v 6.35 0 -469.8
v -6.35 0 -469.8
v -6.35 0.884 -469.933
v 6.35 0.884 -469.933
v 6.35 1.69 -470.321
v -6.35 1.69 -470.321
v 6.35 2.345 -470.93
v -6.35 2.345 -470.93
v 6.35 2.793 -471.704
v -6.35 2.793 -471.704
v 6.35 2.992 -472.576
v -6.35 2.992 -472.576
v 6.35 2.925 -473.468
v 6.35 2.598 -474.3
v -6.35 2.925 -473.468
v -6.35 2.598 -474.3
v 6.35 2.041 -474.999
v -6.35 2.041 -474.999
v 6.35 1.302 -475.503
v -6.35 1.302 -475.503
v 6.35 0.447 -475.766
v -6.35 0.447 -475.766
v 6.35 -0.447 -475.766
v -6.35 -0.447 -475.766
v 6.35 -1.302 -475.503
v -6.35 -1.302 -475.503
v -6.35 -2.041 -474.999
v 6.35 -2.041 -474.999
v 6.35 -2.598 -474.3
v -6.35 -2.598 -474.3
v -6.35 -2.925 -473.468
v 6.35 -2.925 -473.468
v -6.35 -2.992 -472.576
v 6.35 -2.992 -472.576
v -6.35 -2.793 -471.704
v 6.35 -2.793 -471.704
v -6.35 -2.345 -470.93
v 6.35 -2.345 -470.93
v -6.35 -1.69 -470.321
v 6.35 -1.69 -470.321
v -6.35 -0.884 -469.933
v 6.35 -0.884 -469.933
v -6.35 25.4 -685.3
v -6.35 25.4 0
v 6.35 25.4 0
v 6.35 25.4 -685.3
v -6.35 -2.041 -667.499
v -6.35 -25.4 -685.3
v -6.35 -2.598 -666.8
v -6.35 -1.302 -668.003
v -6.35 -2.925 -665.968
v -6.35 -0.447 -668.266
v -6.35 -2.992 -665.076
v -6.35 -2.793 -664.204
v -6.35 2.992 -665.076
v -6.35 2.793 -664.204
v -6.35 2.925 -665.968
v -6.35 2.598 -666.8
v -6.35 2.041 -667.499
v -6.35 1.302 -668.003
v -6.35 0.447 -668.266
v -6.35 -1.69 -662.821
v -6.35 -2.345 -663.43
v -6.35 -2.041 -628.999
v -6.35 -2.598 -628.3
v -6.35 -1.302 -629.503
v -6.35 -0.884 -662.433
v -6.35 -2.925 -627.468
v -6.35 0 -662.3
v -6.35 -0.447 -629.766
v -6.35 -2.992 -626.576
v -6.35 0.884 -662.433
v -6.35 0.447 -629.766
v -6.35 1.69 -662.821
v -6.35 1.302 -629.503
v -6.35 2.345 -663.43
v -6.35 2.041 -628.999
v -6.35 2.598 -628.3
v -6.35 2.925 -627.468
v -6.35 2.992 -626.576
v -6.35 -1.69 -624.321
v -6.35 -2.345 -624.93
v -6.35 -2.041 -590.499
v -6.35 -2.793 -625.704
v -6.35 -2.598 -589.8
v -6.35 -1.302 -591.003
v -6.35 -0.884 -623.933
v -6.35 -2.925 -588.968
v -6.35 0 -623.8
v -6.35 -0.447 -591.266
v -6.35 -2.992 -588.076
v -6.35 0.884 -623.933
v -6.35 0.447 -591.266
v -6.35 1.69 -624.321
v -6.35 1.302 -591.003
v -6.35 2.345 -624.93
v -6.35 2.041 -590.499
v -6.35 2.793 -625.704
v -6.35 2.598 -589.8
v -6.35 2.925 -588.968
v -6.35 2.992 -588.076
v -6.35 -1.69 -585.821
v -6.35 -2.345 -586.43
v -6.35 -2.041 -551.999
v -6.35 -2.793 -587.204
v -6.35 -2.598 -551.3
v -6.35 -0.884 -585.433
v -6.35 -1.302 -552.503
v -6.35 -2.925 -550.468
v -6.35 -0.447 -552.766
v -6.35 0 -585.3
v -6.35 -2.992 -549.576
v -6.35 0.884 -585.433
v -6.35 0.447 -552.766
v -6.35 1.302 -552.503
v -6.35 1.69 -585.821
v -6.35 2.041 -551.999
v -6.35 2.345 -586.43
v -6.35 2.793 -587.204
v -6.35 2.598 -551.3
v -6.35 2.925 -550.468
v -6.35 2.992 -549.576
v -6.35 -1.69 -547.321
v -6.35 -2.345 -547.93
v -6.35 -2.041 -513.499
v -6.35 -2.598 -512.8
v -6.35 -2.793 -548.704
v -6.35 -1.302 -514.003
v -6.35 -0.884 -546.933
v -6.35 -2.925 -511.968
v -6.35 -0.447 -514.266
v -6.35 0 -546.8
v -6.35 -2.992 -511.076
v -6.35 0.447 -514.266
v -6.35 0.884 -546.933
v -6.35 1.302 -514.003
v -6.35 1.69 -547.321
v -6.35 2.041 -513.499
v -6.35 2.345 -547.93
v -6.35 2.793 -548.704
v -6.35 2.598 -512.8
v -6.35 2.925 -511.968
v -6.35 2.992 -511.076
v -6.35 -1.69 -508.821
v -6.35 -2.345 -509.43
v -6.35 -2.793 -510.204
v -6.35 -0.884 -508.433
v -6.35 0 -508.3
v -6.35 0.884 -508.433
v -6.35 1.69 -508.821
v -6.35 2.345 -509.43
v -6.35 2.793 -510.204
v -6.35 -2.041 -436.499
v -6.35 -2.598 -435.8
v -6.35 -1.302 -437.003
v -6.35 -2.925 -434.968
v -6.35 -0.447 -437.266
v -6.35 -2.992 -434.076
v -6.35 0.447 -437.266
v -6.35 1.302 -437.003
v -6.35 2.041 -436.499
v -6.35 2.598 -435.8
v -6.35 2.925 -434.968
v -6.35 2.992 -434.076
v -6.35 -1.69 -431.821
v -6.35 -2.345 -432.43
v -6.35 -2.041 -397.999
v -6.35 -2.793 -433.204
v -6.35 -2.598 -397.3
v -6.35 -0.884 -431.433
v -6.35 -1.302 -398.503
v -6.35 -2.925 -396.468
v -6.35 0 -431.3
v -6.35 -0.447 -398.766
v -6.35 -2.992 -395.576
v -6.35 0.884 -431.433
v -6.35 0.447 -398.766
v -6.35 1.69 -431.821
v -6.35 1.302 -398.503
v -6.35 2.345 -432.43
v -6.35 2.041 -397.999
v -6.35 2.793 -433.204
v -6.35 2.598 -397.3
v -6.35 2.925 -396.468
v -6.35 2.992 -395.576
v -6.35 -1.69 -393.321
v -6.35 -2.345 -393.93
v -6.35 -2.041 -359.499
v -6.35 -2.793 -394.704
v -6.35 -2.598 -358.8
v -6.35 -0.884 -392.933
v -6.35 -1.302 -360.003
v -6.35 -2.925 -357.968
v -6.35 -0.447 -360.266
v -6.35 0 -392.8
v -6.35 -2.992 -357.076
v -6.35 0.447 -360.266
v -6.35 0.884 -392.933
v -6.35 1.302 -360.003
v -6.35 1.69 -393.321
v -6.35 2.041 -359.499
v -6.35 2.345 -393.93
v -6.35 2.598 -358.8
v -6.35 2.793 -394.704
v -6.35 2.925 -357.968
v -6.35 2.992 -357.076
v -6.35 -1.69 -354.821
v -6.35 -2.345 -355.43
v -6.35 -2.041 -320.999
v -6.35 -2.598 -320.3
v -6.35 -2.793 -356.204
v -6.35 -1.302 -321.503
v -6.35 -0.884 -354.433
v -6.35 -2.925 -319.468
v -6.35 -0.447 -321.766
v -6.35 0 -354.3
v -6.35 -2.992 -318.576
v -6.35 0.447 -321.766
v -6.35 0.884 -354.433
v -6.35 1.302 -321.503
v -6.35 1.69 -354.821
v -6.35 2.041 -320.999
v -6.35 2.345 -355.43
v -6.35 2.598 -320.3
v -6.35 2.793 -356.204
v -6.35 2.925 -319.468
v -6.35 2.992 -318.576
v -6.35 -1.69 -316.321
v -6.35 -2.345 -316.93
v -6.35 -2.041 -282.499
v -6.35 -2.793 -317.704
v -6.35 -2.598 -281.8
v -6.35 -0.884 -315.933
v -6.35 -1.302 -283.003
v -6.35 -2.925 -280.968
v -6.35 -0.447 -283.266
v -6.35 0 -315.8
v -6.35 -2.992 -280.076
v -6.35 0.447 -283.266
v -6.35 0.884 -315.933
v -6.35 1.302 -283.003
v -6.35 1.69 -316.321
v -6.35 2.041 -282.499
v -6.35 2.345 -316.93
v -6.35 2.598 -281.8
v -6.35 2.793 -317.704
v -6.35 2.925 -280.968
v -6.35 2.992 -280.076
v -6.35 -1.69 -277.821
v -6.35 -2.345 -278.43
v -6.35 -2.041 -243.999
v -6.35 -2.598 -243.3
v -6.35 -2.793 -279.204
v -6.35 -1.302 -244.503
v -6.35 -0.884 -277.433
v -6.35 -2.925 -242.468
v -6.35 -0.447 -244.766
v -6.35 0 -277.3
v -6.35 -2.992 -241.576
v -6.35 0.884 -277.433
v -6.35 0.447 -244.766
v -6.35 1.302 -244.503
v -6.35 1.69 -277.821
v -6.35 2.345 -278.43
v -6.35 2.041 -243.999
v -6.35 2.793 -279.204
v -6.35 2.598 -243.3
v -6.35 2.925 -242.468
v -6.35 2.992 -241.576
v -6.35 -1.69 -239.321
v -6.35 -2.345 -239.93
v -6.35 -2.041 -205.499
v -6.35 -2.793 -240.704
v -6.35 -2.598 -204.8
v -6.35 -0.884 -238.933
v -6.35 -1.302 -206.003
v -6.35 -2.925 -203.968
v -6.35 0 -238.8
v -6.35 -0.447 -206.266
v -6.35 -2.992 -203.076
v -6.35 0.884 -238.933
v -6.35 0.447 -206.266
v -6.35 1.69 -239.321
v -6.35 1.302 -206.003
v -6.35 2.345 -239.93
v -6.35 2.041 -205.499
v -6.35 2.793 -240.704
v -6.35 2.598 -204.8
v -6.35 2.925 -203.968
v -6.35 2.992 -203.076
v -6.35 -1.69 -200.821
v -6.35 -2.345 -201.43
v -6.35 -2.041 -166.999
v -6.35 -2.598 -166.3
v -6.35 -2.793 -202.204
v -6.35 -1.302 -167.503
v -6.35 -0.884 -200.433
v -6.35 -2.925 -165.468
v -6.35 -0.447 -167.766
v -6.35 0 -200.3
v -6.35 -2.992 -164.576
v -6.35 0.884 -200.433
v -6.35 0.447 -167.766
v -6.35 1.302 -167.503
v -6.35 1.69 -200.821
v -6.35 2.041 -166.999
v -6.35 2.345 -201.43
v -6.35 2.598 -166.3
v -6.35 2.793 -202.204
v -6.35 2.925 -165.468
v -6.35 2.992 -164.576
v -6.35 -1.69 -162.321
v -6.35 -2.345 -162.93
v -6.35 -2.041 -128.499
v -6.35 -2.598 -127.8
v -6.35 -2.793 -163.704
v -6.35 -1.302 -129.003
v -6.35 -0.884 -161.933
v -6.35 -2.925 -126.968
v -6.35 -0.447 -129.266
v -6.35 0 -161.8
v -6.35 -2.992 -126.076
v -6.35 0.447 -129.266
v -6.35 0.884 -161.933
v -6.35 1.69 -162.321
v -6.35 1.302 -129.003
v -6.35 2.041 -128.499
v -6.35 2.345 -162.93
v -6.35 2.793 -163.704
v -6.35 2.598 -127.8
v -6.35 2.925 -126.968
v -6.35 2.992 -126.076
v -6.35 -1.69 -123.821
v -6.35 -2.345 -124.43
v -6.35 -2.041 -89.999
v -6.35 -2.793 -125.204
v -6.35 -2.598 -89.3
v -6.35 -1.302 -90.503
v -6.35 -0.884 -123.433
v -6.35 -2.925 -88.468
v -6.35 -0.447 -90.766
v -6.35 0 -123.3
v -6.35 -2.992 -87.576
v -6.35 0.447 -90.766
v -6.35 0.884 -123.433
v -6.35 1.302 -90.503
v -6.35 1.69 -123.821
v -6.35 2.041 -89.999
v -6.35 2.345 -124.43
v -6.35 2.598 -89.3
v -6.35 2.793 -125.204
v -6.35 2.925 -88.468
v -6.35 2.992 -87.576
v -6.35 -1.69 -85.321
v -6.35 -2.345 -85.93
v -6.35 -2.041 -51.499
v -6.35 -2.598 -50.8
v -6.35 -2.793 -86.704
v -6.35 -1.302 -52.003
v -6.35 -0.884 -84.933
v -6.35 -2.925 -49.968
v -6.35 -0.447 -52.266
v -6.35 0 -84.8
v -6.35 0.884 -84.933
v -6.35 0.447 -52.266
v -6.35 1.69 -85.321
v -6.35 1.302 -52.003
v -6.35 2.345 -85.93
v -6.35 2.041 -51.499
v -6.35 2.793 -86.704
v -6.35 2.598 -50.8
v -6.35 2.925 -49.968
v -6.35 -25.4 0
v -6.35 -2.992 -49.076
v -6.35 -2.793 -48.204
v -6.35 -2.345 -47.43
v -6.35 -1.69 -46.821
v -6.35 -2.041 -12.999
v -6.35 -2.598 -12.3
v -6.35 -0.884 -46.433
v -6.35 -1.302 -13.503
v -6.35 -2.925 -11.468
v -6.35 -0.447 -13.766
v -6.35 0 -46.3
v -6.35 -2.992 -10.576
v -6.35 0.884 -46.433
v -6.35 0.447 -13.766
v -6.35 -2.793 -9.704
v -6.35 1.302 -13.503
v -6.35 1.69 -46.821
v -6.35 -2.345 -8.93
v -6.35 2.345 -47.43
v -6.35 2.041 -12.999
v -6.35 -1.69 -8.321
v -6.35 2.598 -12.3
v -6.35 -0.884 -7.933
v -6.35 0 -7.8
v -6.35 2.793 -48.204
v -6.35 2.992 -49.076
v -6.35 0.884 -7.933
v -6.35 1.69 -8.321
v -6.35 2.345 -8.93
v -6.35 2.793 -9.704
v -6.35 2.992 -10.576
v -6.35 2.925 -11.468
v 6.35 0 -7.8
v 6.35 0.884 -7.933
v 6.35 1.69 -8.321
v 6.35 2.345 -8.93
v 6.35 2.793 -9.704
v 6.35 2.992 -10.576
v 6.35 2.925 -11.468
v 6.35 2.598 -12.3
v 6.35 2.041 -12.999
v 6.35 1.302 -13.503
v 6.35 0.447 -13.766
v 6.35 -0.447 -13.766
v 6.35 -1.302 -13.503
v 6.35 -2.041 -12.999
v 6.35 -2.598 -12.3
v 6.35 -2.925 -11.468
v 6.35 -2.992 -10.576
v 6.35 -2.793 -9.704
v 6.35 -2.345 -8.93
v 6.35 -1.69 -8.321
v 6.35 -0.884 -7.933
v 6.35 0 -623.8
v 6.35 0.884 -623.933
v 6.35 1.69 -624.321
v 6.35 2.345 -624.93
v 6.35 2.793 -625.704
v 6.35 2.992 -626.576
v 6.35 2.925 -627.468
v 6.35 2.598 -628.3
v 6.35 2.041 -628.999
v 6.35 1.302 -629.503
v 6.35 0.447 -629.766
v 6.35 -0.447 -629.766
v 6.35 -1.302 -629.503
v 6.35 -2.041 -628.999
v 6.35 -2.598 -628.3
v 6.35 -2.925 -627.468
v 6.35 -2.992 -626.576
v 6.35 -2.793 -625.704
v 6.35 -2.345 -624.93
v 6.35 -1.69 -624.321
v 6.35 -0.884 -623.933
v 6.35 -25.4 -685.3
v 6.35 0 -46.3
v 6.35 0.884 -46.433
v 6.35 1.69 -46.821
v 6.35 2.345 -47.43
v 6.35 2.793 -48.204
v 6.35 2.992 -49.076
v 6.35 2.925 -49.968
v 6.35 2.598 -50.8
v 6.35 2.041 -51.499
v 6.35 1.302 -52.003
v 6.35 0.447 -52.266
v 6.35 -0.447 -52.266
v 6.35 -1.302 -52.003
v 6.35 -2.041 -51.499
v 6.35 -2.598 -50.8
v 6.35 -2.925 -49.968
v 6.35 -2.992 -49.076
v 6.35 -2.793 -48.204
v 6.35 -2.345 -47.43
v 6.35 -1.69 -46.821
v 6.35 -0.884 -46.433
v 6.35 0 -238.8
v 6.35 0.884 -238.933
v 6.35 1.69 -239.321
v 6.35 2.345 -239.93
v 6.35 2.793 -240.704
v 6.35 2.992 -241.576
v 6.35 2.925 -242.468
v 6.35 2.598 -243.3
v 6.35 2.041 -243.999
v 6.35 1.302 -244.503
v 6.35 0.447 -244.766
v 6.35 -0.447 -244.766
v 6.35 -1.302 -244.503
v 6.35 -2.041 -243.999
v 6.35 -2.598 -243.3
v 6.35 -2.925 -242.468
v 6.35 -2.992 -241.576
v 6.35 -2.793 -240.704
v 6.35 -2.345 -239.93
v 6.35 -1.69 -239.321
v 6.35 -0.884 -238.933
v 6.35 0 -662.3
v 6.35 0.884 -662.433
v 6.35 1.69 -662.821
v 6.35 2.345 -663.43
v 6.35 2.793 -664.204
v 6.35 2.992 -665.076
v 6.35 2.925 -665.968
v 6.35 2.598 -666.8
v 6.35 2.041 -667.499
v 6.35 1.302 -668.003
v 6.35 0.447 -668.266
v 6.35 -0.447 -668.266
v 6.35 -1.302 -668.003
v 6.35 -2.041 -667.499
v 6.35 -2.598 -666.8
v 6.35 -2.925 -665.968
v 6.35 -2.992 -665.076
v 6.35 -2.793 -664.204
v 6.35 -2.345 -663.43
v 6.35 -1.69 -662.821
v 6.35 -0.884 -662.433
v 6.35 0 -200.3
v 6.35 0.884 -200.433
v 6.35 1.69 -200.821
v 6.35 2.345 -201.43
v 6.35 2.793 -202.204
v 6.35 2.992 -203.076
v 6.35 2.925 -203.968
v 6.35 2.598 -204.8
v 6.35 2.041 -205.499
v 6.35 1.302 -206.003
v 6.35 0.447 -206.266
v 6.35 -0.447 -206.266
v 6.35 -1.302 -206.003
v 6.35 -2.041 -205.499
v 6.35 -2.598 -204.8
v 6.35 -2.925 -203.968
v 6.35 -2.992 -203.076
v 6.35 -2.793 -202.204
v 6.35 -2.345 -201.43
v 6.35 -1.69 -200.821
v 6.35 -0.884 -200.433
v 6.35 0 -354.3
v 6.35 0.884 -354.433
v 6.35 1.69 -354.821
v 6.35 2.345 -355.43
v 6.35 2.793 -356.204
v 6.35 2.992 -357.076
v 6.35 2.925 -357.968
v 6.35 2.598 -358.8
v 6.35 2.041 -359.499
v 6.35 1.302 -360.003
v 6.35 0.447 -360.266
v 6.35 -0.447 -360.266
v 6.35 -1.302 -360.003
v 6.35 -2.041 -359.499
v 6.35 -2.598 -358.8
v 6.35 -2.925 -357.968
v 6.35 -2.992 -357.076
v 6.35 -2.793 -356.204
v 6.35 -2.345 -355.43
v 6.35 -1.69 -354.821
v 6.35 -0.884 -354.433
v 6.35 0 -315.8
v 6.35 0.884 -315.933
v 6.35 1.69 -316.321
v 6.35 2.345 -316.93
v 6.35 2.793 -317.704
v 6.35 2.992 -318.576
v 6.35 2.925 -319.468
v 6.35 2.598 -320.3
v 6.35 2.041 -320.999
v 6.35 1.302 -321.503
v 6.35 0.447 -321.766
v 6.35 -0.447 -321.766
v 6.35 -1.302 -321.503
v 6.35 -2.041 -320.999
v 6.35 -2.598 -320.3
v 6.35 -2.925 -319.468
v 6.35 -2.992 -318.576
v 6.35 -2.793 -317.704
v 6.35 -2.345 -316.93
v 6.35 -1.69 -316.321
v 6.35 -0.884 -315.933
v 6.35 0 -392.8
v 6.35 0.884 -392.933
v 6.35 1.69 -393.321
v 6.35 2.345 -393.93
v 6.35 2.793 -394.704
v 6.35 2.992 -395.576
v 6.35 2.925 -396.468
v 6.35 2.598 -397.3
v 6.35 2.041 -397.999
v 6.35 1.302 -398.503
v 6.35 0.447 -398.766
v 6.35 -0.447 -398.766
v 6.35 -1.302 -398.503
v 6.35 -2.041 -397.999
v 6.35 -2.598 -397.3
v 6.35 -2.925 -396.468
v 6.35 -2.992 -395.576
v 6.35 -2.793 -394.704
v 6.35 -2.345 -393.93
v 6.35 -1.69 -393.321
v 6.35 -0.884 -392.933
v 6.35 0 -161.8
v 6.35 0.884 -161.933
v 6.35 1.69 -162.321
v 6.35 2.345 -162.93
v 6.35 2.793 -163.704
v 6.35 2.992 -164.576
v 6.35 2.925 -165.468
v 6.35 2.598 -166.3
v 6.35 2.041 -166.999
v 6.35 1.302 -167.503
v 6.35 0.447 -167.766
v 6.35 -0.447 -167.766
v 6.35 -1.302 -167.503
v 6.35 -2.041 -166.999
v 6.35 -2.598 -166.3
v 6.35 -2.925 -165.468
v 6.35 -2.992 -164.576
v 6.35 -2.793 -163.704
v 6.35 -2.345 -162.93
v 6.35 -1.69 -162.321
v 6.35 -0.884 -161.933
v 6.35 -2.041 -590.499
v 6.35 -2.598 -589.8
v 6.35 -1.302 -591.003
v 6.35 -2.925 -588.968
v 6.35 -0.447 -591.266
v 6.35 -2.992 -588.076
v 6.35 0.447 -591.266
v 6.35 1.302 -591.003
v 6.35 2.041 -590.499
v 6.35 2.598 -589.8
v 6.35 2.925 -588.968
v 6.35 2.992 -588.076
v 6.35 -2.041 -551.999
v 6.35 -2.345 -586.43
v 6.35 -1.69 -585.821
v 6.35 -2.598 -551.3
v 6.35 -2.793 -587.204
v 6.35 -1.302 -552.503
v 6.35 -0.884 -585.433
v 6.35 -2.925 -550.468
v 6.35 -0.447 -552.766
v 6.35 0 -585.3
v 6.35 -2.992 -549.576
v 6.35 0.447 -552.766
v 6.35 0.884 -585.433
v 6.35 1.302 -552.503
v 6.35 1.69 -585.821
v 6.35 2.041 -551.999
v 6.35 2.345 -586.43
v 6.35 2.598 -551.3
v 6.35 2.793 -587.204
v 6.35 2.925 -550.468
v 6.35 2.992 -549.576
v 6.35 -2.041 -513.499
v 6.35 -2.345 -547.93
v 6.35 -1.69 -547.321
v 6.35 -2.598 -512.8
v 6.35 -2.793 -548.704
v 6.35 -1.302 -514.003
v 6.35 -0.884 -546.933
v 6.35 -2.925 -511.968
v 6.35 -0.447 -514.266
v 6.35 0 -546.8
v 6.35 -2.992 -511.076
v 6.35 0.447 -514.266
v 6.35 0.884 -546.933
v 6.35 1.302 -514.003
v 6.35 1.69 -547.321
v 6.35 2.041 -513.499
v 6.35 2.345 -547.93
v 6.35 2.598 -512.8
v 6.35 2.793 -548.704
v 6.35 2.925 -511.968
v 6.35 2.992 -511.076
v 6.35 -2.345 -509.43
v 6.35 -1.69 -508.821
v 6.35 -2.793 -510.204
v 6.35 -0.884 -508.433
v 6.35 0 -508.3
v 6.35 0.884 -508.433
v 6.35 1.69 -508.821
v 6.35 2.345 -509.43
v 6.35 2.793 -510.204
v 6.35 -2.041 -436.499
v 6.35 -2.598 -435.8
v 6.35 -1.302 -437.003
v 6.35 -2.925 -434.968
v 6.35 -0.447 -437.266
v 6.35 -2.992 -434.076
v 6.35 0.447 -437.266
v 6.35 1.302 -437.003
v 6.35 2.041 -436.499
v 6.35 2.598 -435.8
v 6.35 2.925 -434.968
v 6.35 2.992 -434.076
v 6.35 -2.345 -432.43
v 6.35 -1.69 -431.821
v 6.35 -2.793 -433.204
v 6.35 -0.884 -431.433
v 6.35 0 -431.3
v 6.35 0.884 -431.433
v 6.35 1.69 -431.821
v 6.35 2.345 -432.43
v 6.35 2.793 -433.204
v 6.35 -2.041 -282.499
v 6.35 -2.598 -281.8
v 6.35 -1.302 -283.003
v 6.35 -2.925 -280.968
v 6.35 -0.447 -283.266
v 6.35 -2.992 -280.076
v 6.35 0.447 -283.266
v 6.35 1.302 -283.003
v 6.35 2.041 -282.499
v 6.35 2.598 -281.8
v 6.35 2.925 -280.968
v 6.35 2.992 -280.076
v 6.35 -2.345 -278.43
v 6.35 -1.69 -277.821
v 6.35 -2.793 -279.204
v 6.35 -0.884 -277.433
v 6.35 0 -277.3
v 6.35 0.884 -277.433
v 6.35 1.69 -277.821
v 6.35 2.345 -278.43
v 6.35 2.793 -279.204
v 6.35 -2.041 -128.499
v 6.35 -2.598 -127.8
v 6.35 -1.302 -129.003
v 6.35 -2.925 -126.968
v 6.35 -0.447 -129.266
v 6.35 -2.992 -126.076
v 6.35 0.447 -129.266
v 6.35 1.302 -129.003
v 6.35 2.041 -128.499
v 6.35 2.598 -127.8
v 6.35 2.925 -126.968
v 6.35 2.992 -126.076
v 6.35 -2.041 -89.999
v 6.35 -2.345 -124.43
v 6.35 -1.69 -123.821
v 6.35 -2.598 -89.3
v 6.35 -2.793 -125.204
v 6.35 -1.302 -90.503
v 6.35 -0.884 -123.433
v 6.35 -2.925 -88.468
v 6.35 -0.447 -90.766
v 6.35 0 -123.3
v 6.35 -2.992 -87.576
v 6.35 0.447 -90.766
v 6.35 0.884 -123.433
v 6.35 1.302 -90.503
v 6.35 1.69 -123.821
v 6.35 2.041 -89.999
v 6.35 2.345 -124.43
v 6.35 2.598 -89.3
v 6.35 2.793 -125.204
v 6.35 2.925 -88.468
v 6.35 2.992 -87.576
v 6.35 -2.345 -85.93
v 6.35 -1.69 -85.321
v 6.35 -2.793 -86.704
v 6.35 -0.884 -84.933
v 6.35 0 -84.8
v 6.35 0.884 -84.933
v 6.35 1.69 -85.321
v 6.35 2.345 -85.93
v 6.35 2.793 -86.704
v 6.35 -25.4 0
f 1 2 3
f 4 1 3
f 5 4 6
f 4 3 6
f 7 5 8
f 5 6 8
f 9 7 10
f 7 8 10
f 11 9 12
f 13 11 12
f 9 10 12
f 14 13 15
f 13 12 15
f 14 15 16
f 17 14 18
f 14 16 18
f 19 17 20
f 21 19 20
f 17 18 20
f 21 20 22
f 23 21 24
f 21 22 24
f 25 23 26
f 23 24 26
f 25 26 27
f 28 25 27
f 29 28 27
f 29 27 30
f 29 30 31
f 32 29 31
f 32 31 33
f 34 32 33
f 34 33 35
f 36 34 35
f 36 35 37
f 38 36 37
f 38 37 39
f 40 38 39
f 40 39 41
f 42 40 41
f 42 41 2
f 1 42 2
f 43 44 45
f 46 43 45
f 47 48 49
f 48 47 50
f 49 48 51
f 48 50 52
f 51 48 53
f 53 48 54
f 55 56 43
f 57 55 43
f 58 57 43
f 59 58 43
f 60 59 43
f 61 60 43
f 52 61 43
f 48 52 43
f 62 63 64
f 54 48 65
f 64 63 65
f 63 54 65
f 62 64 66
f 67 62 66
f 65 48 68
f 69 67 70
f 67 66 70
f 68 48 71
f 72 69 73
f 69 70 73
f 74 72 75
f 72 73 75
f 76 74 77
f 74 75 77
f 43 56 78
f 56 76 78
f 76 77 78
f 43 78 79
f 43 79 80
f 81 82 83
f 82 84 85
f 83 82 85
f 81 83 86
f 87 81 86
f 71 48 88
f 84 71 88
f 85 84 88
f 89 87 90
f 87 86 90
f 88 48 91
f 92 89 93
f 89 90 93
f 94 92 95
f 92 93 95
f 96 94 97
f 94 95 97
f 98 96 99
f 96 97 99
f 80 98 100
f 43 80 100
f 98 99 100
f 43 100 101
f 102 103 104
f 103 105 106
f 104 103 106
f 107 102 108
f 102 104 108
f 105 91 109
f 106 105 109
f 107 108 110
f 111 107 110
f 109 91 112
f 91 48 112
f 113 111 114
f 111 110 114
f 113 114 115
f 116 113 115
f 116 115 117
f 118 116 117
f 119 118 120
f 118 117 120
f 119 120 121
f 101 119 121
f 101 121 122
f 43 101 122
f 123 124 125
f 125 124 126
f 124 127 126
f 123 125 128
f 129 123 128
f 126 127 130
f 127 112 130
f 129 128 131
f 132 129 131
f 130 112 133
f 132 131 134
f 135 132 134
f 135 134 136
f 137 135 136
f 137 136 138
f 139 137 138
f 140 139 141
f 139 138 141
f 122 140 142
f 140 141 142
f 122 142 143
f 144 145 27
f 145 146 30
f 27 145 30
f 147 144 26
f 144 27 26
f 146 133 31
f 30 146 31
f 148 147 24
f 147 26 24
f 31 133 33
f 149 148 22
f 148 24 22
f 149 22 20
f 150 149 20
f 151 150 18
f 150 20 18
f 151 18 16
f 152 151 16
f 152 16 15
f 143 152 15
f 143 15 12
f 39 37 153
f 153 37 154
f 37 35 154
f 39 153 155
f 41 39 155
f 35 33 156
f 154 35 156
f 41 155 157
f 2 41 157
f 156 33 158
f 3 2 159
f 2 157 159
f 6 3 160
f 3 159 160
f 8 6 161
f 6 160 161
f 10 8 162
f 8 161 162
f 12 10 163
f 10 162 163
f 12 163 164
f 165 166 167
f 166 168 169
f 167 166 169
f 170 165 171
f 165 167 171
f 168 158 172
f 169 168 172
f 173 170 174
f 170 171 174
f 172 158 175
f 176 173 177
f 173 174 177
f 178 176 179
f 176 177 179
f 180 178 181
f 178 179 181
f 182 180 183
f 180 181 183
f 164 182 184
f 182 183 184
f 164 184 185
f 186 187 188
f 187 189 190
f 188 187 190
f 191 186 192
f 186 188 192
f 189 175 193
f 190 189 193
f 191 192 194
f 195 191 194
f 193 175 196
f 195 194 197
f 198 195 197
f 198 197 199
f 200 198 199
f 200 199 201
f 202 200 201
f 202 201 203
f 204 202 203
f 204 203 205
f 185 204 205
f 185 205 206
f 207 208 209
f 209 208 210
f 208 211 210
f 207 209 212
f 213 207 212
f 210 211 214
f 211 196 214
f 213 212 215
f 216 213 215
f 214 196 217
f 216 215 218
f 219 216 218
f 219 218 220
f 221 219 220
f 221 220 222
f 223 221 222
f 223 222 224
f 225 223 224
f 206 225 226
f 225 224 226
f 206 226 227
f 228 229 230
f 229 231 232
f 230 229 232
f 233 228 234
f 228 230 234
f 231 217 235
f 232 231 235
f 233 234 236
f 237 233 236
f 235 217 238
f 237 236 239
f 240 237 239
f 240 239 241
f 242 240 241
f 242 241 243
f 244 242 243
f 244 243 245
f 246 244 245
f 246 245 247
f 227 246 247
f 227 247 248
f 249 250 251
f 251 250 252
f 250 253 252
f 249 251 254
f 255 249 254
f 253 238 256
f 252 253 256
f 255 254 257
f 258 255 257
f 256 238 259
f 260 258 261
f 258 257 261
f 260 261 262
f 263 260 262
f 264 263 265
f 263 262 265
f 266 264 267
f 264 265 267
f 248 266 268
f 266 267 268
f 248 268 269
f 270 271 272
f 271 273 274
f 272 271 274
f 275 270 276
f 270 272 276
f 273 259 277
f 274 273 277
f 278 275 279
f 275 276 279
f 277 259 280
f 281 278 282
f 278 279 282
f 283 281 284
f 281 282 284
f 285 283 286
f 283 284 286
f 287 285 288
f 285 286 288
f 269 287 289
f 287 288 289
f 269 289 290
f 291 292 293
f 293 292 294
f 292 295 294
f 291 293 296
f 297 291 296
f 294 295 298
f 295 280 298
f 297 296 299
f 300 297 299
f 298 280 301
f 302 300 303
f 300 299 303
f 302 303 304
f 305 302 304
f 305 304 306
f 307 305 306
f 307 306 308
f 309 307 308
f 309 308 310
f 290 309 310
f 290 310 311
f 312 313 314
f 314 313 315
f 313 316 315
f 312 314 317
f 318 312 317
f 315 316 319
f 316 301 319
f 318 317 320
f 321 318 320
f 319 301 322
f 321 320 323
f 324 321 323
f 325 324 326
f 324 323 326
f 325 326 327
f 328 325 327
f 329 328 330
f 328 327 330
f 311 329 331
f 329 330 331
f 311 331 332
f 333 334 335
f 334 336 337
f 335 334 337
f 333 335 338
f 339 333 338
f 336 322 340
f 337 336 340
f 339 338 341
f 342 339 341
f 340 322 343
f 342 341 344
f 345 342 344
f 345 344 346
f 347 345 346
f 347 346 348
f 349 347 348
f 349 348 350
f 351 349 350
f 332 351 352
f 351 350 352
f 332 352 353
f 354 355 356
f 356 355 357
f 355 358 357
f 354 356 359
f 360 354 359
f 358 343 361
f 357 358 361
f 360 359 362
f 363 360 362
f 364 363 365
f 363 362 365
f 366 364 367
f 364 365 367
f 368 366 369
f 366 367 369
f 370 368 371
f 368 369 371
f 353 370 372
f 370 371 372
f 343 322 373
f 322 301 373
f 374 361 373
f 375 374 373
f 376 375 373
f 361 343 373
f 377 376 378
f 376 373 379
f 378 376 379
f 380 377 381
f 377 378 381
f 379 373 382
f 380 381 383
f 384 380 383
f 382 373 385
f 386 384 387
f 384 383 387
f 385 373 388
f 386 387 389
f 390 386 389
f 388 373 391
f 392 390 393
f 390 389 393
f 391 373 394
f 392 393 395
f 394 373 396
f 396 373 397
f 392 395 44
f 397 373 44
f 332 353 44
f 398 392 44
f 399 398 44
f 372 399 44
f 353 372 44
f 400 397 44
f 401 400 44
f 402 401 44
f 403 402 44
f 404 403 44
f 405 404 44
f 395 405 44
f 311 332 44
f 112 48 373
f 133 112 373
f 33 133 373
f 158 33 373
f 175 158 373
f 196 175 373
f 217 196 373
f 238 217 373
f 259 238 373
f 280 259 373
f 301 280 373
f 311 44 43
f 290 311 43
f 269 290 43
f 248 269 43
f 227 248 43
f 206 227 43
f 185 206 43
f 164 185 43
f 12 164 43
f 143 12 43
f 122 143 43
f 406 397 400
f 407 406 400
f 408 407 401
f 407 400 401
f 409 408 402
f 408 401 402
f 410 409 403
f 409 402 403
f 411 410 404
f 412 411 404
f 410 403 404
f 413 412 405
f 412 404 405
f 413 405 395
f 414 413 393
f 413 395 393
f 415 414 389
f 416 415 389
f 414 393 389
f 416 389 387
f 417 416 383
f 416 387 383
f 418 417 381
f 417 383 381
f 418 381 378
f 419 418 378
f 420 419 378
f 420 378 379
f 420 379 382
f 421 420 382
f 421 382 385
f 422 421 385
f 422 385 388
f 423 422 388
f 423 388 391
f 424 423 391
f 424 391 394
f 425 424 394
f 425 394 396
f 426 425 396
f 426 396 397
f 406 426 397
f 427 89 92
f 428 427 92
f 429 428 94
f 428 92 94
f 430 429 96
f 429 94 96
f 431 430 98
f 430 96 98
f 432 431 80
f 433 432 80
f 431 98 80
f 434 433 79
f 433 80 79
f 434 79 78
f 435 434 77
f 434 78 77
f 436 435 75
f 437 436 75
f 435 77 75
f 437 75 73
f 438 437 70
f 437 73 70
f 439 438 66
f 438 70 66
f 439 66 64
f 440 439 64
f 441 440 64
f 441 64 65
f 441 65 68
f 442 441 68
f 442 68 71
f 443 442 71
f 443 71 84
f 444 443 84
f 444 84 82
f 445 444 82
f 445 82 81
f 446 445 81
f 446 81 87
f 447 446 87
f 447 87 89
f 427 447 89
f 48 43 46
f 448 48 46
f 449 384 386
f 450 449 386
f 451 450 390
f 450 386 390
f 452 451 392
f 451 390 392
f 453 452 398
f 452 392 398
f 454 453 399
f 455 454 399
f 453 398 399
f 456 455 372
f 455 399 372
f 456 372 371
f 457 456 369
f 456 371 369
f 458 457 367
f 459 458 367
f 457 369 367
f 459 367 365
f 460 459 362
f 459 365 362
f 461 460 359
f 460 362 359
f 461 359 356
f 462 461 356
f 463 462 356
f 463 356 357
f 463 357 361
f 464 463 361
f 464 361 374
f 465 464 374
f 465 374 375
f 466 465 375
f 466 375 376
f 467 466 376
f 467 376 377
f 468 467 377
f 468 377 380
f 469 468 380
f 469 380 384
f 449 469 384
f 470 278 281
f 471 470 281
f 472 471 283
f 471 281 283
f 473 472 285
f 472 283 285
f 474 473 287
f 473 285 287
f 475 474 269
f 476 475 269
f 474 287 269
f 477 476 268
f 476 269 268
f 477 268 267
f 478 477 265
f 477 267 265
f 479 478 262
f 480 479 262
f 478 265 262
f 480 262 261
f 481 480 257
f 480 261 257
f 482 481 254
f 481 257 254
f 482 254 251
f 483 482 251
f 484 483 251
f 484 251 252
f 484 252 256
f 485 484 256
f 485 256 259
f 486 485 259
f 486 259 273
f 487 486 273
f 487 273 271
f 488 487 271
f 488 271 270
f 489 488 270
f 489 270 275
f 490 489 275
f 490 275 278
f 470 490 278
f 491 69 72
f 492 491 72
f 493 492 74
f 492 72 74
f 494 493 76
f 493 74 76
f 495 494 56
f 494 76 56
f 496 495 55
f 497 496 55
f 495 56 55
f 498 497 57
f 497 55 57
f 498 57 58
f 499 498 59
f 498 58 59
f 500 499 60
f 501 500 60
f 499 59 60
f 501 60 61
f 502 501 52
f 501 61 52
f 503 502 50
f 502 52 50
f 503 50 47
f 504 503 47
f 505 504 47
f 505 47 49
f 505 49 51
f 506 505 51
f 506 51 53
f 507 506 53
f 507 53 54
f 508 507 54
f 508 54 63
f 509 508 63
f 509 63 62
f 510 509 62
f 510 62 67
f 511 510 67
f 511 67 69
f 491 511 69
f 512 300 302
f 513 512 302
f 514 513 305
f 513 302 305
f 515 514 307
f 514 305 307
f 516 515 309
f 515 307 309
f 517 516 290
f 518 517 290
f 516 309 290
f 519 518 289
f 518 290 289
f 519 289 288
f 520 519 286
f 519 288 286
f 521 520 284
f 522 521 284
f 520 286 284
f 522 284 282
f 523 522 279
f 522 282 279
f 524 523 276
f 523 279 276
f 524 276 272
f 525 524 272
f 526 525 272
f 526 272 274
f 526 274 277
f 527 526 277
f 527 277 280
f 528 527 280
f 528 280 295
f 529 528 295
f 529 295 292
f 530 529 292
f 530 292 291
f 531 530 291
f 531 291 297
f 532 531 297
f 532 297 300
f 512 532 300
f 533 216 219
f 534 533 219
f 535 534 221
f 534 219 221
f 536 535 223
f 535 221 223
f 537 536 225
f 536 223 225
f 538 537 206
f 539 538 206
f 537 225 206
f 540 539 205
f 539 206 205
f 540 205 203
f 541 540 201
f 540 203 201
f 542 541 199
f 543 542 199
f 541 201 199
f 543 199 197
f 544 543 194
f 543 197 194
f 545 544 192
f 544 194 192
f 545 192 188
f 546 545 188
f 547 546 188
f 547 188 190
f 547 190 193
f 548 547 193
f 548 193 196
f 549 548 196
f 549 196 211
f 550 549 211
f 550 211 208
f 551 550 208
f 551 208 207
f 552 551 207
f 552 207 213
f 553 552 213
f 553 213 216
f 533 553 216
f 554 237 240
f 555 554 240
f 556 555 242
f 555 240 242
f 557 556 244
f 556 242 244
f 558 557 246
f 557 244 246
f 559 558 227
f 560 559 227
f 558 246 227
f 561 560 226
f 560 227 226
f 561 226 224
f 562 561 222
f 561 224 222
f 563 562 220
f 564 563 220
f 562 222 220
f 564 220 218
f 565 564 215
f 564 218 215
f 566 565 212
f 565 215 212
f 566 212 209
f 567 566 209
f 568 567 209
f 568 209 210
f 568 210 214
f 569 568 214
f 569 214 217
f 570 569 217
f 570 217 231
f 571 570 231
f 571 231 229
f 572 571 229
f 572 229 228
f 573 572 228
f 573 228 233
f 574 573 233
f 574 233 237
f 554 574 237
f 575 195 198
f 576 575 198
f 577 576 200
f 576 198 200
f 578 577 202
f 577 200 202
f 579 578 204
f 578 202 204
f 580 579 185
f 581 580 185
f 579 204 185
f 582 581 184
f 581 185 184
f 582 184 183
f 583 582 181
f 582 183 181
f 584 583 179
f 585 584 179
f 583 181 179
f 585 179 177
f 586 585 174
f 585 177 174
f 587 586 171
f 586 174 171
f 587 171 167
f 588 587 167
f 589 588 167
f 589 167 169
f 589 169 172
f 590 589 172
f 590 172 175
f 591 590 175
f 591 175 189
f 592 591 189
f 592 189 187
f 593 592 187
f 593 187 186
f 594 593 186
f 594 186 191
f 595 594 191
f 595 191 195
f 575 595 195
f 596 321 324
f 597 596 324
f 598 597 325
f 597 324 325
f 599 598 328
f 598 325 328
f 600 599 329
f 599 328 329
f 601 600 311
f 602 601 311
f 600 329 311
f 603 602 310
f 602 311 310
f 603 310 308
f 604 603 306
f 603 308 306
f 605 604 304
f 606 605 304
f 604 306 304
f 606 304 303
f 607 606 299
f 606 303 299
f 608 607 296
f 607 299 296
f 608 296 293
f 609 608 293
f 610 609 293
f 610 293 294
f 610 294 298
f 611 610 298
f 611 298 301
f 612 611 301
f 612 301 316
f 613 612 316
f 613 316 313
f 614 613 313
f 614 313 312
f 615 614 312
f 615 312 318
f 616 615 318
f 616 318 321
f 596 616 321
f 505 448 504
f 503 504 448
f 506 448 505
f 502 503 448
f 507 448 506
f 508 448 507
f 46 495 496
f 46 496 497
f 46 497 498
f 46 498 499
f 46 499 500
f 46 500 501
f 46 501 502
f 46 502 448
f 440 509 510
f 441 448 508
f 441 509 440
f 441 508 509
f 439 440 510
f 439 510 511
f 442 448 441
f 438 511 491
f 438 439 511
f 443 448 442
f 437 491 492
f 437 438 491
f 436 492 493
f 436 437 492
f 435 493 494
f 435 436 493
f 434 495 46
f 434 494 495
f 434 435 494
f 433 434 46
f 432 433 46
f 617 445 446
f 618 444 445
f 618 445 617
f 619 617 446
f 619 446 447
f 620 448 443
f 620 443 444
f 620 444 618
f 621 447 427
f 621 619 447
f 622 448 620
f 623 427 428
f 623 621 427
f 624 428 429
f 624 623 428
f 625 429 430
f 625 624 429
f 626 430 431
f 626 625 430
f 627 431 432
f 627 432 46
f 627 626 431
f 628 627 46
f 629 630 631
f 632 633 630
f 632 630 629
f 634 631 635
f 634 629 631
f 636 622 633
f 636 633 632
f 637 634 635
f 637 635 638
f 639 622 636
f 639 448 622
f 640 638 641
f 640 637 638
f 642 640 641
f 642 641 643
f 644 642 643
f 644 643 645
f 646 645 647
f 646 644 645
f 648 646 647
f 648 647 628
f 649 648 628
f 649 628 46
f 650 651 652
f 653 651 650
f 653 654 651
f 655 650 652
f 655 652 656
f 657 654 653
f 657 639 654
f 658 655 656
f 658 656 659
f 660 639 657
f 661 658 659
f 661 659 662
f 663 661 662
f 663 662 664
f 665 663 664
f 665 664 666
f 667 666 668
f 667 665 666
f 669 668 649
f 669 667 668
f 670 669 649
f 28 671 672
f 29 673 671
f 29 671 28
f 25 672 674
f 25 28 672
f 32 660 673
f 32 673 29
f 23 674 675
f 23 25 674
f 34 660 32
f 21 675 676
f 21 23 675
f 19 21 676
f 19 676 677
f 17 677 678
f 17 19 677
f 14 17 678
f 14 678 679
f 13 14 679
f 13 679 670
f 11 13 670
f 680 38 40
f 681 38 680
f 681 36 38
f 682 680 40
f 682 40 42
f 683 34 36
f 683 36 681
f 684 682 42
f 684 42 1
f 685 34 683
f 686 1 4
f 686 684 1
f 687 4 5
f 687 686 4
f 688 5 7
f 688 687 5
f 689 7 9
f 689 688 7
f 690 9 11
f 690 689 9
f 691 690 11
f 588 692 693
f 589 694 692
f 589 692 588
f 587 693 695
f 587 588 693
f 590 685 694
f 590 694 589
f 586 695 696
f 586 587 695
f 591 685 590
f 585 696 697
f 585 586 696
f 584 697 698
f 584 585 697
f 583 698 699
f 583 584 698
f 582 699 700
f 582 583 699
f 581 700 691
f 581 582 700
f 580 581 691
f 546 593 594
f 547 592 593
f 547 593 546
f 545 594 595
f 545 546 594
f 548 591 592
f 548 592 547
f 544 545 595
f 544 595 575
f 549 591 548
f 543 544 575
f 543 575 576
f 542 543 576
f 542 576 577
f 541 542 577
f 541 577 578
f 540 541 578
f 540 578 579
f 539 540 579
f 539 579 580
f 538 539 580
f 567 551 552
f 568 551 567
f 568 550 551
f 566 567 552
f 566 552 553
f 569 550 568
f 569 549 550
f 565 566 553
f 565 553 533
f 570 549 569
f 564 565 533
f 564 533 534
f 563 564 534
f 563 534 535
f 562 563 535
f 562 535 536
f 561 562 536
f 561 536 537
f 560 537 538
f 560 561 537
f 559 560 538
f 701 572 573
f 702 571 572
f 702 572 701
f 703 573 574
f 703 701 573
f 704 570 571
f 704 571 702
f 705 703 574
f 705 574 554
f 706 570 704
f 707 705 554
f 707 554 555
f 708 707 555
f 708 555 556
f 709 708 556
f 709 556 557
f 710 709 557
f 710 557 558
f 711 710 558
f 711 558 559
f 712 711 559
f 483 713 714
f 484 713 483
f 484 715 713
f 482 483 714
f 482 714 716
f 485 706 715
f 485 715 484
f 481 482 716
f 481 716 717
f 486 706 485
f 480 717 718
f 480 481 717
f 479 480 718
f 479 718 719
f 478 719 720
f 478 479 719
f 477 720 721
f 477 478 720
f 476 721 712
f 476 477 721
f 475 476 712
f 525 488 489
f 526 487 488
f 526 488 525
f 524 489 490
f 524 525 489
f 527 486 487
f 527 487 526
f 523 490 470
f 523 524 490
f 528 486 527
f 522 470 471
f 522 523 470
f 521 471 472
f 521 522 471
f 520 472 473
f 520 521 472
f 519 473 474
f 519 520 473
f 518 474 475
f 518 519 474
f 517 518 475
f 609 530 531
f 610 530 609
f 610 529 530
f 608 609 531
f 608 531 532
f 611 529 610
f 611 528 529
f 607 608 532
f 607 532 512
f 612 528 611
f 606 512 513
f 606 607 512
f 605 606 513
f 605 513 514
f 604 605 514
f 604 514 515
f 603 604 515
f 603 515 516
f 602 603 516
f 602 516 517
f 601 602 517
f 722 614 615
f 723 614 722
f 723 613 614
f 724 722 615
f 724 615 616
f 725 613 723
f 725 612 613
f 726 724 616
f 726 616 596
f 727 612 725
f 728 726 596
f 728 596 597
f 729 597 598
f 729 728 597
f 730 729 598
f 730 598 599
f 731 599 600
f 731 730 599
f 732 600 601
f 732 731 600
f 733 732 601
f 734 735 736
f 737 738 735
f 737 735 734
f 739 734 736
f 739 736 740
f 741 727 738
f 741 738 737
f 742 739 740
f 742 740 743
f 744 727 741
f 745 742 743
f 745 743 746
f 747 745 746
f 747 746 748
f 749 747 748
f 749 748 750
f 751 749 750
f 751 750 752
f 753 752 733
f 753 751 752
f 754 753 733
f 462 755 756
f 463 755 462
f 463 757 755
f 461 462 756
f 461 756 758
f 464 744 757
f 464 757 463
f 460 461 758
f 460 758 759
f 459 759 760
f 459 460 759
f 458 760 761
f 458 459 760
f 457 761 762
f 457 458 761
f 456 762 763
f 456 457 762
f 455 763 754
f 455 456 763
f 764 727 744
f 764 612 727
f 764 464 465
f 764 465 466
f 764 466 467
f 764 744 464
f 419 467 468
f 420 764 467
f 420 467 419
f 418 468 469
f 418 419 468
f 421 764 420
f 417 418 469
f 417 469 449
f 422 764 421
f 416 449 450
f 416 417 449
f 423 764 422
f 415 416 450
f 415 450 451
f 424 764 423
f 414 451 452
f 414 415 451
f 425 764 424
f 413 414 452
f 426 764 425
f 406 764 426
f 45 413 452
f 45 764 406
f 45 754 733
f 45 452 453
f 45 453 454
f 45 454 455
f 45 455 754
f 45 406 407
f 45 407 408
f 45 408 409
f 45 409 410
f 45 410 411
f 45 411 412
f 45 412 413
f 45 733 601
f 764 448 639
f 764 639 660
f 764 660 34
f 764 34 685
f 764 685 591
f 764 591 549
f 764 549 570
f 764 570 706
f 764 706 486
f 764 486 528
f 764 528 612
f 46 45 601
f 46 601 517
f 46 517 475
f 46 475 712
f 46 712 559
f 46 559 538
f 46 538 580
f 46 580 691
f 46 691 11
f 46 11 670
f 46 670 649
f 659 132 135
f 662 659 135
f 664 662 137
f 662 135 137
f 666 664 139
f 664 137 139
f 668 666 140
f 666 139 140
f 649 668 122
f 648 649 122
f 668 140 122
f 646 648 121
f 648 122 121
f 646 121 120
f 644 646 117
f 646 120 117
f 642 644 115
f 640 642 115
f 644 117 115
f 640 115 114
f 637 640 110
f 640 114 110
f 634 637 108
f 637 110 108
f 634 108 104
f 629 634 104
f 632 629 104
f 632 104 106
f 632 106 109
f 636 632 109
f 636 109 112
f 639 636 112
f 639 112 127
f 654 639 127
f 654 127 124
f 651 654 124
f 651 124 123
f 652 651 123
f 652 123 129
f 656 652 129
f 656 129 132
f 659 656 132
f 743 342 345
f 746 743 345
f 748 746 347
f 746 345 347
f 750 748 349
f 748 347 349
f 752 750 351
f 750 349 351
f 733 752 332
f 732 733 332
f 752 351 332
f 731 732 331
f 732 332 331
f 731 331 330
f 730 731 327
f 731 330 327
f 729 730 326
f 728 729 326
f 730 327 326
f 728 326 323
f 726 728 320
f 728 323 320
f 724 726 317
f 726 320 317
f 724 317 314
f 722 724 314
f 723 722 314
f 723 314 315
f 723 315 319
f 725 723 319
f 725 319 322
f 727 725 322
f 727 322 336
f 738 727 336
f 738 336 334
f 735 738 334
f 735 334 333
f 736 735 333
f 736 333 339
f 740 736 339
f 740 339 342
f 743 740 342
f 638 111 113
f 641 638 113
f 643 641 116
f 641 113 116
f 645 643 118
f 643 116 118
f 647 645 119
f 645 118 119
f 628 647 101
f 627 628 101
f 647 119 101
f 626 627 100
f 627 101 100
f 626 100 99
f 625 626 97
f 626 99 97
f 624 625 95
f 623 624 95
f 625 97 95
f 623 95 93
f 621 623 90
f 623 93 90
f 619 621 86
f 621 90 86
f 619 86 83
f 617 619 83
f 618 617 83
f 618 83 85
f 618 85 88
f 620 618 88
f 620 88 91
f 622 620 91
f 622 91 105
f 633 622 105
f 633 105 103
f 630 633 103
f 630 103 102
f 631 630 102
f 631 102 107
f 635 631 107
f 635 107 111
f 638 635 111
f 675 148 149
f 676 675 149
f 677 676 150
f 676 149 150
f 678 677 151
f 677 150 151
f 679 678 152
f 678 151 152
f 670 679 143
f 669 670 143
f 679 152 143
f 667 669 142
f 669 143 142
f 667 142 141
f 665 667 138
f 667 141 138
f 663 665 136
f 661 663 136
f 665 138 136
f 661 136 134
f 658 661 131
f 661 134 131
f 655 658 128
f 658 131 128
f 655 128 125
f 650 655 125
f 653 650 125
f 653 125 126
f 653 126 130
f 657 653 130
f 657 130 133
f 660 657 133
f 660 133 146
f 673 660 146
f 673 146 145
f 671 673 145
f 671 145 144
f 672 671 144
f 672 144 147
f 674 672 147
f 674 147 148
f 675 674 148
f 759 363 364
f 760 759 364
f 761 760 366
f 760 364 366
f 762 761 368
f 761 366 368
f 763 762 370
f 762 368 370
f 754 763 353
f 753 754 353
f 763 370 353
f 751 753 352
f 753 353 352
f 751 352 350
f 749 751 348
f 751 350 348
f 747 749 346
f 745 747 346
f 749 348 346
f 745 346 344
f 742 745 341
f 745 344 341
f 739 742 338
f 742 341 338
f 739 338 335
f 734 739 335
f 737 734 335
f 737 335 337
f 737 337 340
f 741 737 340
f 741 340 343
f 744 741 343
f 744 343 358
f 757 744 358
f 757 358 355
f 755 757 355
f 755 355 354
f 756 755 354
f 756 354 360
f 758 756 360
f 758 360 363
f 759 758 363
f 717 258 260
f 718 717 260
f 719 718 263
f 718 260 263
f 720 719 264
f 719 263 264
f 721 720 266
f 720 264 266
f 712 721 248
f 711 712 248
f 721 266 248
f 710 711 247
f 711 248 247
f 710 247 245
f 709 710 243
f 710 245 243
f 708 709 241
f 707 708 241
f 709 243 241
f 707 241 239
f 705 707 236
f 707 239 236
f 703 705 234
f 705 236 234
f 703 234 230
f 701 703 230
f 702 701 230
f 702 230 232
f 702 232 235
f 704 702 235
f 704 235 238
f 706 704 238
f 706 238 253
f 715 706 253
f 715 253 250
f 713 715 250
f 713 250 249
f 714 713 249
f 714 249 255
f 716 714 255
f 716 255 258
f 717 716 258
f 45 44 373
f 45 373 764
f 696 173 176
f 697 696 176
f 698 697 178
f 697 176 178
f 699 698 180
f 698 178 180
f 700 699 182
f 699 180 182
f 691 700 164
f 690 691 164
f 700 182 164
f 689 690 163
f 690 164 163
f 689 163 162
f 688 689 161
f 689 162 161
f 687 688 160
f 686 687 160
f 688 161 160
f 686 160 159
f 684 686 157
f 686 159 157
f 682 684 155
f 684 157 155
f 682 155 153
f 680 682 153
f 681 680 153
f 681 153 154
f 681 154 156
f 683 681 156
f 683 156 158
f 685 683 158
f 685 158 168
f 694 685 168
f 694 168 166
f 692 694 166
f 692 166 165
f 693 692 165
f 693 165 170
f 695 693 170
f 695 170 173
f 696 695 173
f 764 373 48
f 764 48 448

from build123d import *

# Parameters (mm, degrees)
CROQUIS2_W              = 12.7
CROQUIS2_H              = 50.8
SALIENTE_EXTRUIR1_DEPTH = 685.3
CROQUIS3_R              = 3
CORTAR_EXTRUIR1_DEPTH   = 13.7


with BuildPart() as part:
    # Croquis2 → Saliente-Extruir1 (new body)
    with BuildSketch(Plane.XY):
        Rectangle(CROQUIS2_W, CROQUIS2_H)
    extrude(amount=-SALIENTE_EXTRUIR1_DEPTH)

    # Croquis3 → Cortar-Extruir1 (cut, through all)
    with BuildSketch(Plane.ZY.offset(6.35)):
        with Locations((-665.3, 0)):
            Circle(CROQUIS3_R)
        with Locations((-626.8, 0)):
            Circle(CROQUIS3_R)
        with Locations((-588.3, 0)):
            Circle(CROQUIS3_R)
        with Locations((-549.8, 0)):
            Circle(CROQUIS3_R)
        with Locations((-511.3, 0)):
            Circle(CROQUIS3_R)
        with Locations((-472.8, 0)):
            Circle(CROQUIS3_R)
        with Locations((-434.3, 0)):
            Circle(CROQUIS3_R)
        with Locations((-395.8, 0)):
            Circle(CROQUIS3_R)
        with Locations((-357.3, 0)):
            Circle(CROQUIS3_R)
        with Locations((-318.8, 0)):
            Circle(CROQUIS3_R)
        with Locations((-280.3, 0)):
            Circle(CROQUIS3_R)
        with Locations((-241.8, 0)):
            Circle(CROQUIS3_R)
        with Locations((-203.3, 0)):
            Circle(CROQUIS3_R)
        with Locations((-164.8, 0)):
            Circle(CROQUIS3_R)
        with Locations((-126.3, 0)):
            Circle(CROQUIS3_R)
        with Locations((-87.8, 0)):
            Circle(CROQUIS3_R)
        with Locations((-49.3, 0)):
            Circle(CROQUIS3_R)
        with Locations((-10.8, 0)):
            Circle(CROQUIS3_R)
    extrude(amount=-CORTAR_EXTRUIR1_DEPTH, mode=Mode.SUBTRACT)


solid = part.part
